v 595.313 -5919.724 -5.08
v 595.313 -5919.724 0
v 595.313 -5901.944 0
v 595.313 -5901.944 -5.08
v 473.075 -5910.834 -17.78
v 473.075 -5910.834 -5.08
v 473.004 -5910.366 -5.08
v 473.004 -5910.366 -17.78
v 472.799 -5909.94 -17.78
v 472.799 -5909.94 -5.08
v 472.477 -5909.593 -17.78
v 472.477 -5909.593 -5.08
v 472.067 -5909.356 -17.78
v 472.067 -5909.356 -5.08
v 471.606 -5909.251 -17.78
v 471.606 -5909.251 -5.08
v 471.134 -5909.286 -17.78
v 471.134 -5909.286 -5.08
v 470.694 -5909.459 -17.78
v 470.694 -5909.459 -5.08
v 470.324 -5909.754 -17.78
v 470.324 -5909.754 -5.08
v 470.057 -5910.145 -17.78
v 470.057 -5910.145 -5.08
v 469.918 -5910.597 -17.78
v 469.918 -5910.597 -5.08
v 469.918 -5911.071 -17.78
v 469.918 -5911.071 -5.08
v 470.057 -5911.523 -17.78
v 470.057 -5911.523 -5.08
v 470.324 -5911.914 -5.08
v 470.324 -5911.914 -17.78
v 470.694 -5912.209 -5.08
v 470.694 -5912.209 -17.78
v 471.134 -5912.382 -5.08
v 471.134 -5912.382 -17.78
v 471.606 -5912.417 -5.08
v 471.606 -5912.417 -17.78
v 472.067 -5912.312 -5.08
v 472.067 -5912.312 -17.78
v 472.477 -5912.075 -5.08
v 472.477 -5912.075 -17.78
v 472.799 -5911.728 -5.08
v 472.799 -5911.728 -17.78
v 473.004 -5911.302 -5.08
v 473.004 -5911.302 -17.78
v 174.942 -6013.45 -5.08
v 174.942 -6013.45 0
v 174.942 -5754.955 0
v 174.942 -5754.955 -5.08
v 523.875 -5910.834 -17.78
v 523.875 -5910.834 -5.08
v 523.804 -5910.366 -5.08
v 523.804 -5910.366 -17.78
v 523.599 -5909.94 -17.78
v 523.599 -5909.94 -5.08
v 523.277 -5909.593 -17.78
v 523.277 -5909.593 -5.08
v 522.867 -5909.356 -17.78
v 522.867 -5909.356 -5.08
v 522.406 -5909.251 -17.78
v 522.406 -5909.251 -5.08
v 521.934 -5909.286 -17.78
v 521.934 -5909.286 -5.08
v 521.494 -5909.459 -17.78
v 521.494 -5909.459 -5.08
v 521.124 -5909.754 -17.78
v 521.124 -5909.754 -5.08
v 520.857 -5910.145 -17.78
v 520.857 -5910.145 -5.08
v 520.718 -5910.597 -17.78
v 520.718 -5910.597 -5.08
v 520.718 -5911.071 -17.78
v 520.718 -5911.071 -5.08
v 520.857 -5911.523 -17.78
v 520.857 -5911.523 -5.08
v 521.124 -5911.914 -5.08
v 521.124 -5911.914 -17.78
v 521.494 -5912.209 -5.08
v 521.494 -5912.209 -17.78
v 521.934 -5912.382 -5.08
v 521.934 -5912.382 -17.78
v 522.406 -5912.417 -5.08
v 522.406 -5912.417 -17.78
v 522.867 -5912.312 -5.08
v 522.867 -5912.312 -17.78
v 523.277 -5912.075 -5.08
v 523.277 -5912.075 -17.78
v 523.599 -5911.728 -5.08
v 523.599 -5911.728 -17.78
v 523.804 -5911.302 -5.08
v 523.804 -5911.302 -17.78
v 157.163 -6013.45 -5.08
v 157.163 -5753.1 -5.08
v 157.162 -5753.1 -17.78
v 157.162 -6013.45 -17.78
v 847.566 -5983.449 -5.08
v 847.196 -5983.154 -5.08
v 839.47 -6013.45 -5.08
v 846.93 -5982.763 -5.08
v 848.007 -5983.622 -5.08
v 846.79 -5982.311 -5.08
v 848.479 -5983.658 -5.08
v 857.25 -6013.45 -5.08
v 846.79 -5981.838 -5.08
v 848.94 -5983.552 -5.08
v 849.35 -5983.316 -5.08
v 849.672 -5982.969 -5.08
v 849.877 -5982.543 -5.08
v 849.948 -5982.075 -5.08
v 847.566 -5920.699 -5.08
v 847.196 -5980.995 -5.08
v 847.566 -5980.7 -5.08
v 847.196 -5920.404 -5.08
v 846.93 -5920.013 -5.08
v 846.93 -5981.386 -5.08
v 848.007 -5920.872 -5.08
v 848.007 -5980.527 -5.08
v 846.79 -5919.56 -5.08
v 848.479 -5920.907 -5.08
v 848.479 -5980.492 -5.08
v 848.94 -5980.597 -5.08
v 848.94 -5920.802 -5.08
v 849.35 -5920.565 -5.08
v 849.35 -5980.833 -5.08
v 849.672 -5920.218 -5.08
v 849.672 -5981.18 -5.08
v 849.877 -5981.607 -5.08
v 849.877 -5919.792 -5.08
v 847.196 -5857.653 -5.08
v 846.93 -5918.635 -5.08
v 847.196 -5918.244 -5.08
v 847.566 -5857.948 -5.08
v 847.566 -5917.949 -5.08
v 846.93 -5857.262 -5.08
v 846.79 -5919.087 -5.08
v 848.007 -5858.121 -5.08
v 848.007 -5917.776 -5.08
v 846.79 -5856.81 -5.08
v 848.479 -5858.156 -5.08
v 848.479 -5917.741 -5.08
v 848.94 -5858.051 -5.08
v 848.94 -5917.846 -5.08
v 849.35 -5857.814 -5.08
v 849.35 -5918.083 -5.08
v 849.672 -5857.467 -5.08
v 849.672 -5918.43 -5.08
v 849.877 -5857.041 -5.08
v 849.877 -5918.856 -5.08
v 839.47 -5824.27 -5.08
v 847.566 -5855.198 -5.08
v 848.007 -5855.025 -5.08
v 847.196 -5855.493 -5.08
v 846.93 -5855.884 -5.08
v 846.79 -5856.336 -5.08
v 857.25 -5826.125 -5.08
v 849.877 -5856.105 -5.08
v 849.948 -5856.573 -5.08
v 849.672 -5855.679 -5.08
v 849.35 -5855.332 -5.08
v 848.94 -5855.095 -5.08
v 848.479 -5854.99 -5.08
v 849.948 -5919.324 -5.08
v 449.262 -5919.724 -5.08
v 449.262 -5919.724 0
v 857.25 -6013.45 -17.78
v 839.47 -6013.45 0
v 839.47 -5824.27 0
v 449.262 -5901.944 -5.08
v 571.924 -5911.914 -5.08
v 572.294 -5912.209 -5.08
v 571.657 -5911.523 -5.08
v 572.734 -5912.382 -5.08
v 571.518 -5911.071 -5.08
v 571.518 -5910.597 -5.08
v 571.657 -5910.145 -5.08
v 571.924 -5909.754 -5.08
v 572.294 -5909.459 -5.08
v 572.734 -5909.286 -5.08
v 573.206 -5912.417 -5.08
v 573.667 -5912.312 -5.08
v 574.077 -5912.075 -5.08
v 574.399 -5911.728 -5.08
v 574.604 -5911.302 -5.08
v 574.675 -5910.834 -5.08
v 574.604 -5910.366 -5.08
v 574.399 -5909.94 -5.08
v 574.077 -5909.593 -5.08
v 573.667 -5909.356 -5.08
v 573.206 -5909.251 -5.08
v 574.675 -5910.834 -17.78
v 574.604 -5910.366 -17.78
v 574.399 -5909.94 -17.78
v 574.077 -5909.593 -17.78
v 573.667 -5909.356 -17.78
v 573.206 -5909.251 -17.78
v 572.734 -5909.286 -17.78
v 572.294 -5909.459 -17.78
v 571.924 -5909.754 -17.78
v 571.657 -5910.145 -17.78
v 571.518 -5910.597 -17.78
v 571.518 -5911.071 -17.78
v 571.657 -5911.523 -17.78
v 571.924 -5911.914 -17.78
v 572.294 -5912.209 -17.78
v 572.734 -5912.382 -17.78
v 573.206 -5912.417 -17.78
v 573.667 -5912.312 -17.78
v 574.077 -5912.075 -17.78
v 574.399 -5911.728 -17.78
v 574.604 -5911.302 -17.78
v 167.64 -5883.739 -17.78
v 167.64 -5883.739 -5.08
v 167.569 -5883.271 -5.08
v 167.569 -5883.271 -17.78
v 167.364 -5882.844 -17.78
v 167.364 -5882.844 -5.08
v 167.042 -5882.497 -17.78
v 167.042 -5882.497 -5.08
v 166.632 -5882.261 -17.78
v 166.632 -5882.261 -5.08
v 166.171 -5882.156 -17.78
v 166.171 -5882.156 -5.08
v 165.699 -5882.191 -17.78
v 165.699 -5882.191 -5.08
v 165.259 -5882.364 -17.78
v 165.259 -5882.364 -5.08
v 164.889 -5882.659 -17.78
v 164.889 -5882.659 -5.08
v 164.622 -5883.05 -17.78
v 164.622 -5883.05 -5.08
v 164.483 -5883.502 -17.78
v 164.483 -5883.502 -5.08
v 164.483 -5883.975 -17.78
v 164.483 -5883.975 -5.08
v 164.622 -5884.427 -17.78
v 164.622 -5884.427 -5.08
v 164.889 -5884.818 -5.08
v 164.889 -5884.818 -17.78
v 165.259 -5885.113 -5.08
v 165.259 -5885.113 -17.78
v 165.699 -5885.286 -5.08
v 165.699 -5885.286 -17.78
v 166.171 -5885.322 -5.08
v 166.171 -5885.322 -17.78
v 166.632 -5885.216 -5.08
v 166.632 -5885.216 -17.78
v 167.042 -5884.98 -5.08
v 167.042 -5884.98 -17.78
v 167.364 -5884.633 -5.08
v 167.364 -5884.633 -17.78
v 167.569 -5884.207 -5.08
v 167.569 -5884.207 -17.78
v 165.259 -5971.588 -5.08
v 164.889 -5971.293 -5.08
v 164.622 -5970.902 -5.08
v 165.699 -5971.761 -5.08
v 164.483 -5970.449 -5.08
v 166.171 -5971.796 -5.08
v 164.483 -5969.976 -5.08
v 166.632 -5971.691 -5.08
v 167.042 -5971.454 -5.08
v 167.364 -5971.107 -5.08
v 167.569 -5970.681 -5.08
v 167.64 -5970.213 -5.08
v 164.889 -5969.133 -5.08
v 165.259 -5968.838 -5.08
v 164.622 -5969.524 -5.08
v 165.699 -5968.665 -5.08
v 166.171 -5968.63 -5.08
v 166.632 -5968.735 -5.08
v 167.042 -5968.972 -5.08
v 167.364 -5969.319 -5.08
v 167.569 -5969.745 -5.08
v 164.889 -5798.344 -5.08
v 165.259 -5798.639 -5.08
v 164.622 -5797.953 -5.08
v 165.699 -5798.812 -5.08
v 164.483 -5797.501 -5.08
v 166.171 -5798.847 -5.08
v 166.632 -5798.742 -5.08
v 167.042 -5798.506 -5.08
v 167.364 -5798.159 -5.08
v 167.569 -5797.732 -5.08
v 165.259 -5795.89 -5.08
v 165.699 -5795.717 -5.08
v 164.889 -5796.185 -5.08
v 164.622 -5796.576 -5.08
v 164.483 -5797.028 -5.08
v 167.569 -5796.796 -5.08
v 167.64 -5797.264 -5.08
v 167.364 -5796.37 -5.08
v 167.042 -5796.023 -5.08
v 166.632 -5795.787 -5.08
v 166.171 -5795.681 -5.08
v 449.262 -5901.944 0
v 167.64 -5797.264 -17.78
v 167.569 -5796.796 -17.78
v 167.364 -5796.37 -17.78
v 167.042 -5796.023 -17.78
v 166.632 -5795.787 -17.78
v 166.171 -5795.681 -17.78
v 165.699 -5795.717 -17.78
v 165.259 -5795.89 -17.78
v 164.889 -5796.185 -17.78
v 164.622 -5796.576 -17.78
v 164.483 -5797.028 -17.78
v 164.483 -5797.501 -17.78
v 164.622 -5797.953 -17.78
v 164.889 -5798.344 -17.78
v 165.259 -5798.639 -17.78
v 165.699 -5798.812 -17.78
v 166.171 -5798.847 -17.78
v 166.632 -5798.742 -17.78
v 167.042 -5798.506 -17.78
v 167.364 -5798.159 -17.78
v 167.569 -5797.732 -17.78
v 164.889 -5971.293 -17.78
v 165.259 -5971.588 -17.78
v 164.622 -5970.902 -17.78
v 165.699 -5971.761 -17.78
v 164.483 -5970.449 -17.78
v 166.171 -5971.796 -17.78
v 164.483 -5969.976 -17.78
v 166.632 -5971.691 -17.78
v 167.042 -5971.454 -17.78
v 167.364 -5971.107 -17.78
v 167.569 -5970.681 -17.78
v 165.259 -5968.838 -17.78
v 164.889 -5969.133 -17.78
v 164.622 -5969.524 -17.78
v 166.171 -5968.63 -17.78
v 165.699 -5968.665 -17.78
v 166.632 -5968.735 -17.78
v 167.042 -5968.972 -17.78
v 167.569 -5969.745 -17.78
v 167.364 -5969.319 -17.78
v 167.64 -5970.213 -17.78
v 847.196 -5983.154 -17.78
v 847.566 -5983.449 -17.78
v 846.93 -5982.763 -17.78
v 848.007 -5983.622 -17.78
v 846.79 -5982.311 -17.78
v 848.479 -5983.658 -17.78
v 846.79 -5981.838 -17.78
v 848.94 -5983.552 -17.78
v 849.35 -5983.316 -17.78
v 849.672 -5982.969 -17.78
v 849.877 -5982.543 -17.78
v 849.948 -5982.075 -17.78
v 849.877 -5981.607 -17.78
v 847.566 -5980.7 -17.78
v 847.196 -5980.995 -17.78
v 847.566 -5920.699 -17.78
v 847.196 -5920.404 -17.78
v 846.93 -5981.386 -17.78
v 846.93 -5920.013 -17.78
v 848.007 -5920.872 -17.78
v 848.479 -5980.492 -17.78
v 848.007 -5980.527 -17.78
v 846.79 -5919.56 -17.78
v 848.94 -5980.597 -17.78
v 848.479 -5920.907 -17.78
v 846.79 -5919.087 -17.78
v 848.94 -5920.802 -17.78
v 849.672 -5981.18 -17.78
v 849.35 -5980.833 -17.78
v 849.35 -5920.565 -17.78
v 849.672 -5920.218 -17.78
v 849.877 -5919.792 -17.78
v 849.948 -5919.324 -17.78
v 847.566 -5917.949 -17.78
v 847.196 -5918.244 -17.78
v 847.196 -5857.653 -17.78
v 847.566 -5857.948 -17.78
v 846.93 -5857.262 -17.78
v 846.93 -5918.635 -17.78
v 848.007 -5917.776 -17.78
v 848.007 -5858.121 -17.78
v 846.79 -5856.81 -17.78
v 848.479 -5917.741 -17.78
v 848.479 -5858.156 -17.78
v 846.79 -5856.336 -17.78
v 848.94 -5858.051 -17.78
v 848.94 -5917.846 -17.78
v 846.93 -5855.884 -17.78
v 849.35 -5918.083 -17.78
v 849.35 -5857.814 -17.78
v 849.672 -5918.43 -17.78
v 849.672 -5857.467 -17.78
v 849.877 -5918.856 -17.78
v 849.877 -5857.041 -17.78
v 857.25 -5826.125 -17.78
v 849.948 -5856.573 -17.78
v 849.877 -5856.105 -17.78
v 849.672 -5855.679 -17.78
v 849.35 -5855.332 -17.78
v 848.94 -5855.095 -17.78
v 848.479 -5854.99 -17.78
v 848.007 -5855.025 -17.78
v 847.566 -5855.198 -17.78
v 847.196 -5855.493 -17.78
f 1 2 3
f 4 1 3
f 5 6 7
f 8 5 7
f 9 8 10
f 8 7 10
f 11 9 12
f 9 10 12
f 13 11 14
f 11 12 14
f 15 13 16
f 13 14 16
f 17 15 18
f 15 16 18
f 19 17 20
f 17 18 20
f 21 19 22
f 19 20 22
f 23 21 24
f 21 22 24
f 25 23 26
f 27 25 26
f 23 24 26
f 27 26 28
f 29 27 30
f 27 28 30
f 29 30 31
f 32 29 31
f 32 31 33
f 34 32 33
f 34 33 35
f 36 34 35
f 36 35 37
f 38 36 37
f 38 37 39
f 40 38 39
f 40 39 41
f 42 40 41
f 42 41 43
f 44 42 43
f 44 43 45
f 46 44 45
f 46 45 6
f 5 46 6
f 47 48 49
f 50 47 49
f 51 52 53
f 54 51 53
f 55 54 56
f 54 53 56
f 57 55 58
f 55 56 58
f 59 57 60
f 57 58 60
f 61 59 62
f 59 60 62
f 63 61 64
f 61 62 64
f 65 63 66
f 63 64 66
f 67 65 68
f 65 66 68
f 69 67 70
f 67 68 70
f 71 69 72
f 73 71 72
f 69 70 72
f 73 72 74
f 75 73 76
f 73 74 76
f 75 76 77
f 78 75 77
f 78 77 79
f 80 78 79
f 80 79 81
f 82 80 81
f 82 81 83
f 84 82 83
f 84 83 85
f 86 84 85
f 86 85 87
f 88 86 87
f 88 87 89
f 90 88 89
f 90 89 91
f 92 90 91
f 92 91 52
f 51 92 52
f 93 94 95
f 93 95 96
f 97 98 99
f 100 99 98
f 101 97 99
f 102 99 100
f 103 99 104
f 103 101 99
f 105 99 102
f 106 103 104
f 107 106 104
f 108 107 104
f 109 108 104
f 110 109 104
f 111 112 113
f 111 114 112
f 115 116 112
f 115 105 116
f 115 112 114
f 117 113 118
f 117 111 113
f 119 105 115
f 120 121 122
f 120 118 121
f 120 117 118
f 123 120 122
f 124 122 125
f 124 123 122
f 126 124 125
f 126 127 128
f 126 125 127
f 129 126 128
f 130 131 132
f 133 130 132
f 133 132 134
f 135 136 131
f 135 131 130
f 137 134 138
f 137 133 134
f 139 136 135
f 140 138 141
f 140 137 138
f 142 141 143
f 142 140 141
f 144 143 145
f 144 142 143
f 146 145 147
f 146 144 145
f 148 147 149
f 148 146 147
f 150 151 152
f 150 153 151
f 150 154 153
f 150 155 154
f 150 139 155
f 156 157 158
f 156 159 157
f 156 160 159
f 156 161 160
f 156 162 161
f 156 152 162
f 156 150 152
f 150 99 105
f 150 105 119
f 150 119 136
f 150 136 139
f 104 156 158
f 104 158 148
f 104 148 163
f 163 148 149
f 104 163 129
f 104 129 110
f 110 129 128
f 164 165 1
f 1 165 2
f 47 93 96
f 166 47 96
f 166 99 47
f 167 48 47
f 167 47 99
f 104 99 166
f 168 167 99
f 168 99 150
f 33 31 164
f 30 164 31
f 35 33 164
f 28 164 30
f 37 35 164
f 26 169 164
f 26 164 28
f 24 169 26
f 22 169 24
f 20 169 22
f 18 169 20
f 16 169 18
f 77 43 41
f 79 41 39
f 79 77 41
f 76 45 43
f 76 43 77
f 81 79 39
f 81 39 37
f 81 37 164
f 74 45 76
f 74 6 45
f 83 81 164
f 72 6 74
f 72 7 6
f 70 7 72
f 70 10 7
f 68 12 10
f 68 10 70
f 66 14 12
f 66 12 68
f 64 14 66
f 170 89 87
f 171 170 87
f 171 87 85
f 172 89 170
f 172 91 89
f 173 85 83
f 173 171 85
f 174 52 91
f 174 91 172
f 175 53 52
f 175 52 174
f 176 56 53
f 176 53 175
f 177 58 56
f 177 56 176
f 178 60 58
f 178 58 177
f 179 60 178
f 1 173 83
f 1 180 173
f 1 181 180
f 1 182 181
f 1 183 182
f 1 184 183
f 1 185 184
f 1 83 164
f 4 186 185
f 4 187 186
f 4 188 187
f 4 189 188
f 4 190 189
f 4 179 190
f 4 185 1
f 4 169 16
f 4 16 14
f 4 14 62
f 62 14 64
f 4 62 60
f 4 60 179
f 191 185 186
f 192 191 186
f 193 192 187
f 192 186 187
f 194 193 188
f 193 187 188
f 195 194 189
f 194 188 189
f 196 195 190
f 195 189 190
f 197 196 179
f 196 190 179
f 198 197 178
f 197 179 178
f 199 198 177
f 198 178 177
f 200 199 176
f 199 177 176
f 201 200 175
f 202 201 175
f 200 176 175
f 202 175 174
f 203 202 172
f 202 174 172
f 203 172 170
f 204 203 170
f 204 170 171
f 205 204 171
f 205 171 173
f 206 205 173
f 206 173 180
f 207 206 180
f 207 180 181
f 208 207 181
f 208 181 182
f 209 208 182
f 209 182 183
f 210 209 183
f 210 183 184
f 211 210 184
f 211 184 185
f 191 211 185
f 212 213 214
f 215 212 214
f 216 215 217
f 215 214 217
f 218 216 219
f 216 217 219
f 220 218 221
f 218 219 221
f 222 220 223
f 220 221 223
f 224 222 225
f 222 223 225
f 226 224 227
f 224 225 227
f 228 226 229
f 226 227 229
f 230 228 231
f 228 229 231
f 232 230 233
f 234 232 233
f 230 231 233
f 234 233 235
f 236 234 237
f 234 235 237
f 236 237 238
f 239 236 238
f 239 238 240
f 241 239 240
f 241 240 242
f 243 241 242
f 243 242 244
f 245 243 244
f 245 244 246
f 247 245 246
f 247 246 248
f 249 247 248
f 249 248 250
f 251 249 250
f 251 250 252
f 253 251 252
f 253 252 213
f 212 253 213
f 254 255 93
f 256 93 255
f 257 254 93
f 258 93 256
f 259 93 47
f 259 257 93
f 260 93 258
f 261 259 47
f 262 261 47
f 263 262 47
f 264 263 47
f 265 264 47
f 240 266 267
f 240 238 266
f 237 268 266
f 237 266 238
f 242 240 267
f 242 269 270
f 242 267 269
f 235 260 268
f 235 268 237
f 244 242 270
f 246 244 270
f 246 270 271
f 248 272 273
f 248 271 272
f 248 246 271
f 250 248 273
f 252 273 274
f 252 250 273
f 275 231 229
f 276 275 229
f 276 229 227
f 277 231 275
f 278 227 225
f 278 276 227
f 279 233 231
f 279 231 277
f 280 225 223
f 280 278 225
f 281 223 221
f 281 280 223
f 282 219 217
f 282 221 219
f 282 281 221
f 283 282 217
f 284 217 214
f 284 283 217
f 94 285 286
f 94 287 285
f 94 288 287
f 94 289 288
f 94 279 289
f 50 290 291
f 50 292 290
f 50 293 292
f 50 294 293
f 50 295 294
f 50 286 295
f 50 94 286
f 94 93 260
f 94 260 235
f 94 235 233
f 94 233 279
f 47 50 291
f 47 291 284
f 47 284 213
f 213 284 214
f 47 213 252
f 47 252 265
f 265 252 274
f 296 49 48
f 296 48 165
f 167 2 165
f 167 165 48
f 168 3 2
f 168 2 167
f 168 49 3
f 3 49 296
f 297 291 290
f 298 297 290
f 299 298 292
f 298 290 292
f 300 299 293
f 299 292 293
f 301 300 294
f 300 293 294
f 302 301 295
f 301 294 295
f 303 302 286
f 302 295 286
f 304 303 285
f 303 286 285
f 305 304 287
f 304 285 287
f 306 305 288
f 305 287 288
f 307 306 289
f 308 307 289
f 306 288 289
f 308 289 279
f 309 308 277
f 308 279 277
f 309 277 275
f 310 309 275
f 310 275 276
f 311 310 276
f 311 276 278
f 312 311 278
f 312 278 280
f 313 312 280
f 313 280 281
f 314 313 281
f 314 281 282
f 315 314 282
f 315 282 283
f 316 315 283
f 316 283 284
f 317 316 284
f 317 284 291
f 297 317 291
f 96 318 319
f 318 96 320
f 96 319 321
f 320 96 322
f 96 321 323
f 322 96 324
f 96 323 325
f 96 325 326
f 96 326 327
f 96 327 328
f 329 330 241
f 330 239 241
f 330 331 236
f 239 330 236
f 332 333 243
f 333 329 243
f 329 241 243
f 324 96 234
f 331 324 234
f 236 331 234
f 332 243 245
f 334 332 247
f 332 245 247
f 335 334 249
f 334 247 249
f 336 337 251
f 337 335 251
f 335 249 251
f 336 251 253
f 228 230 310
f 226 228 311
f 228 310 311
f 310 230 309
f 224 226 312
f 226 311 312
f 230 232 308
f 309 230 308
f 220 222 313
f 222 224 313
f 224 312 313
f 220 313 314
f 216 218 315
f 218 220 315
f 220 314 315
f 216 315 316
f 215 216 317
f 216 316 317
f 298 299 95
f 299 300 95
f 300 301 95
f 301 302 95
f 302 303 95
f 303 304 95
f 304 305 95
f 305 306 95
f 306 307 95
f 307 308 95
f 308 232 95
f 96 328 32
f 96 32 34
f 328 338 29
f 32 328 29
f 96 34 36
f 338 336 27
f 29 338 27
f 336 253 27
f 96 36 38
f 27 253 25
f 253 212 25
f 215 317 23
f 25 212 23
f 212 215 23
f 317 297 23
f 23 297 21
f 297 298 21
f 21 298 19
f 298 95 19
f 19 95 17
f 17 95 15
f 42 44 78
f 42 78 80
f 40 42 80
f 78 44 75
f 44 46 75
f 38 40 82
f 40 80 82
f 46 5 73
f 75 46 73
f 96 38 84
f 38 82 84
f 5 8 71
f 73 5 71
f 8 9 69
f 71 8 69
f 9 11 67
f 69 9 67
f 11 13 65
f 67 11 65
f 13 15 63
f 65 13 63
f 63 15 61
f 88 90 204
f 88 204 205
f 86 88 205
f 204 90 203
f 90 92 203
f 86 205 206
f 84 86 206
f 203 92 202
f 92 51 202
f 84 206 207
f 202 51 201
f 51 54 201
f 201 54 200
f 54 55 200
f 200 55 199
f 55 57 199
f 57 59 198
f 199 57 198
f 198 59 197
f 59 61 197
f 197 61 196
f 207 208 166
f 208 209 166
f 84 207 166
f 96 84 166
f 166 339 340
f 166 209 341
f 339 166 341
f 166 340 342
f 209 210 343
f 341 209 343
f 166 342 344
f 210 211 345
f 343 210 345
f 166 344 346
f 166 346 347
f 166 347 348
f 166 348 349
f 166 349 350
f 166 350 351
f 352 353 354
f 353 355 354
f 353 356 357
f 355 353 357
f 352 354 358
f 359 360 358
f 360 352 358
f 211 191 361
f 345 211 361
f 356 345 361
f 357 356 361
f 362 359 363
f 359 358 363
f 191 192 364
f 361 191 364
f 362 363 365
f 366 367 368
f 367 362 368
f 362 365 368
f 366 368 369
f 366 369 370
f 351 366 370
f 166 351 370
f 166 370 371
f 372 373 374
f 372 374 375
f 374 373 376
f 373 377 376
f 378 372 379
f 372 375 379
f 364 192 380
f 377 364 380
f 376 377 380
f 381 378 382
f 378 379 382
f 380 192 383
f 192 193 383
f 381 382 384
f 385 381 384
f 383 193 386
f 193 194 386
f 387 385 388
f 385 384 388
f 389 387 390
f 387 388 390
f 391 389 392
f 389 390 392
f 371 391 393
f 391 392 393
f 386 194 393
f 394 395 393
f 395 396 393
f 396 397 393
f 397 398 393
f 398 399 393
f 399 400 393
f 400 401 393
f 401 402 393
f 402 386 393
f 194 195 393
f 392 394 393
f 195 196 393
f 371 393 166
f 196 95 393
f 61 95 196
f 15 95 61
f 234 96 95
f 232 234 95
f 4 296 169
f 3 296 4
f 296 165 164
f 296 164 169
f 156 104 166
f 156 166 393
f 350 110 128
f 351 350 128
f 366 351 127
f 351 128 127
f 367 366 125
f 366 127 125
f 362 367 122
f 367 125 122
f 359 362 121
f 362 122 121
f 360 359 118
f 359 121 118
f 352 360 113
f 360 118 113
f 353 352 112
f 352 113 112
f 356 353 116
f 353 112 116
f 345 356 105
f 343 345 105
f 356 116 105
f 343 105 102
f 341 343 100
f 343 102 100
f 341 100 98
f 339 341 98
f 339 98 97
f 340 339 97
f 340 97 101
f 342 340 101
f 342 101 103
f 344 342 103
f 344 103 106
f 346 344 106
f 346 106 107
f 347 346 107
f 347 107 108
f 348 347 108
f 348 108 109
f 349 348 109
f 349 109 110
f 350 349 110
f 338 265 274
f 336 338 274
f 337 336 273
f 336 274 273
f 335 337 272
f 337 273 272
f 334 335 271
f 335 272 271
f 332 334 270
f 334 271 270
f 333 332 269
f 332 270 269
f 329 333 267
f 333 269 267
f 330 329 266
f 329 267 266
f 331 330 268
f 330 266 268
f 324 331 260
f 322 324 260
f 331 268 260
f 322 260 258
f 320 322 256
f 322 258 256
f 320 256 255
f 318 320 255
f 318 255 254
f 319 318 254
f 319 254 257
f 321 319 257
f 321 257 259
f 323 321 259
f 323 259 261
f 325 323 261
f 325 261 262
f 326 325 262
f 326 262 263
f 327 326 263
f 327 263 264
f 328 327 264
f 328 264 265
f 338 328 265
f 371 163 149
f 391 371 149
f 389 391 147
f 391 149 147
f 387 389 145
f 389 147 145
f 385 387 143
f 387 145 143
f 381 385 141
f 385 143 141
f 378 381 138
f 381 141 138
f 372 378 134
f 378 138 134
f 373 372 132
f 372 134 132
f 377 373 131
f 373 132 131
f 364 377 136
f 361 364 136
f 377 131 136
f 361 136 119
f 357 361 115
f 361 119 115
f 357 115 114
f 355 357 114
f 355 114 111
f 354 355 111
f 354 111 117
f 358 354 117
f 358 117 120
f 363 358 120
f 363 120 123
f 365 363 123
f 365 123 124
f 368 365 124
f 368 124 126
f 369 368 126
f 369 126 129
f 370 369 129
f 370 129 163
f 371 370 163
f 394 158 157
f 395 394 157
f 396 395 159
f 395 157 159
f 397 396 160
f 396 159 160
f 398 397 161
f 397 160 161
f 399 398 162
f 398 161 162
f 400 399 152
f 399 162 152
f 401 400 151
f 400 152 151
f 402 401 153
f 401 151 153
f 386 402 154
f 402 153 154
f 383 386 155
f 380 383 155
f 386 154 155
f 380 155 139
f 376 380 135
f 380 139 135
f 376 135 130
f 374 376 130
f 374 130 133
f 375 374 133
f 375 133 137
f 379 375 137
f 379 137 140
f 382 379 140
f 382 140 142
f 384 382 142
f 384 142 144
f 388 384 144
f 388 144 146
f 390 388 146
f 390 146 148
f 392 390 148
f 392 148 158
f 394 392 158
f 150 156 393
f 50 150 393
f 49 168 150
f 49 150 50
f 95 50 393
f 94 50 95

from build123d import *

# Parameters (mm, degrees)
EXTRUDE3_DEPTH     = 17.78
SKETCH8_R          = 1.5875
CUT_EXTRUDE4_DEPTH = 17.78
SKETCH9_W          = 17.78
SKETCH9_H          = 260.35
SKETCH9_H_2        = 189.179603175
SKETCH9_W_2        = 146.050000002
SKETCH9_H_3        = 17.78
CUT_EXTRUDE5_DEPTH = 5.08


with BuildPart() as part:
    # Sketch7 → Extrude3 (new body)
    with BuildSketch(Plane.XY):
        Polygon((157.1625, -6013.45), (857.25, -6013.45), (857.25, -5826.125), (157.1625, -5753.1), align=None)
    extrude(amount=-EXTRUDE3_DEPTH)

    # Sketch8 → Cut-Extrude4 (cut)
    with BuildSketch(Plane.XY):
        with Locations((166.0525, -5970.212883599)):
            Circle(SKETCH8_R)
        with Locations((166.0525, -5883.738650795)):
            Circle(SKETCH8_R)
        with Locations((166.0525, -5797.264417991)):
            Circle(SKETCH8_R)
        with Locations((848.36, -5982.074616401)):
            Circle(SKETCH8_R)
        with Locations((848.36, -5919.323849205)):
            Circle(SKETCH8_R)
        with Locations((848.36, -5856.573082009)):
            Circle(SKETCH8_R)
        with Locations((471.4875, -5910.834)):
            Circle(SKETCH8_R)
        with Locations((522.2875, -5910.834)):
            Circle(SKETCH8_R)
        with Locations((573.0875, -5910.834)):
            Circle(SKETCH8_R)
    extrude(amount=-CUT_EXTRUDE4_DEPTH, mode=Mode.SUBTRACT)

    # Sketch9 → Cut-Extrude5 (cut)
    with BuildSketch(Plane.XY):
        with Locations((166.0525, -5883.275)):
            Rectangle(SKETCH9_W, SKETCH9_H)
        with Locations((848.36, -5918.860198413)):
            Rectangle(SKETCH9_W, SKETCH9_H_2)
        with Locations((522.2875, -5910.834)):
            Rectangle(SKETCH9_W_2, SKETCH9_H_3)
    extrude(amount=-CUT_EXTRUDE5_DEPTH, mode=Mode.SUBTRACT)


solid = part.part
